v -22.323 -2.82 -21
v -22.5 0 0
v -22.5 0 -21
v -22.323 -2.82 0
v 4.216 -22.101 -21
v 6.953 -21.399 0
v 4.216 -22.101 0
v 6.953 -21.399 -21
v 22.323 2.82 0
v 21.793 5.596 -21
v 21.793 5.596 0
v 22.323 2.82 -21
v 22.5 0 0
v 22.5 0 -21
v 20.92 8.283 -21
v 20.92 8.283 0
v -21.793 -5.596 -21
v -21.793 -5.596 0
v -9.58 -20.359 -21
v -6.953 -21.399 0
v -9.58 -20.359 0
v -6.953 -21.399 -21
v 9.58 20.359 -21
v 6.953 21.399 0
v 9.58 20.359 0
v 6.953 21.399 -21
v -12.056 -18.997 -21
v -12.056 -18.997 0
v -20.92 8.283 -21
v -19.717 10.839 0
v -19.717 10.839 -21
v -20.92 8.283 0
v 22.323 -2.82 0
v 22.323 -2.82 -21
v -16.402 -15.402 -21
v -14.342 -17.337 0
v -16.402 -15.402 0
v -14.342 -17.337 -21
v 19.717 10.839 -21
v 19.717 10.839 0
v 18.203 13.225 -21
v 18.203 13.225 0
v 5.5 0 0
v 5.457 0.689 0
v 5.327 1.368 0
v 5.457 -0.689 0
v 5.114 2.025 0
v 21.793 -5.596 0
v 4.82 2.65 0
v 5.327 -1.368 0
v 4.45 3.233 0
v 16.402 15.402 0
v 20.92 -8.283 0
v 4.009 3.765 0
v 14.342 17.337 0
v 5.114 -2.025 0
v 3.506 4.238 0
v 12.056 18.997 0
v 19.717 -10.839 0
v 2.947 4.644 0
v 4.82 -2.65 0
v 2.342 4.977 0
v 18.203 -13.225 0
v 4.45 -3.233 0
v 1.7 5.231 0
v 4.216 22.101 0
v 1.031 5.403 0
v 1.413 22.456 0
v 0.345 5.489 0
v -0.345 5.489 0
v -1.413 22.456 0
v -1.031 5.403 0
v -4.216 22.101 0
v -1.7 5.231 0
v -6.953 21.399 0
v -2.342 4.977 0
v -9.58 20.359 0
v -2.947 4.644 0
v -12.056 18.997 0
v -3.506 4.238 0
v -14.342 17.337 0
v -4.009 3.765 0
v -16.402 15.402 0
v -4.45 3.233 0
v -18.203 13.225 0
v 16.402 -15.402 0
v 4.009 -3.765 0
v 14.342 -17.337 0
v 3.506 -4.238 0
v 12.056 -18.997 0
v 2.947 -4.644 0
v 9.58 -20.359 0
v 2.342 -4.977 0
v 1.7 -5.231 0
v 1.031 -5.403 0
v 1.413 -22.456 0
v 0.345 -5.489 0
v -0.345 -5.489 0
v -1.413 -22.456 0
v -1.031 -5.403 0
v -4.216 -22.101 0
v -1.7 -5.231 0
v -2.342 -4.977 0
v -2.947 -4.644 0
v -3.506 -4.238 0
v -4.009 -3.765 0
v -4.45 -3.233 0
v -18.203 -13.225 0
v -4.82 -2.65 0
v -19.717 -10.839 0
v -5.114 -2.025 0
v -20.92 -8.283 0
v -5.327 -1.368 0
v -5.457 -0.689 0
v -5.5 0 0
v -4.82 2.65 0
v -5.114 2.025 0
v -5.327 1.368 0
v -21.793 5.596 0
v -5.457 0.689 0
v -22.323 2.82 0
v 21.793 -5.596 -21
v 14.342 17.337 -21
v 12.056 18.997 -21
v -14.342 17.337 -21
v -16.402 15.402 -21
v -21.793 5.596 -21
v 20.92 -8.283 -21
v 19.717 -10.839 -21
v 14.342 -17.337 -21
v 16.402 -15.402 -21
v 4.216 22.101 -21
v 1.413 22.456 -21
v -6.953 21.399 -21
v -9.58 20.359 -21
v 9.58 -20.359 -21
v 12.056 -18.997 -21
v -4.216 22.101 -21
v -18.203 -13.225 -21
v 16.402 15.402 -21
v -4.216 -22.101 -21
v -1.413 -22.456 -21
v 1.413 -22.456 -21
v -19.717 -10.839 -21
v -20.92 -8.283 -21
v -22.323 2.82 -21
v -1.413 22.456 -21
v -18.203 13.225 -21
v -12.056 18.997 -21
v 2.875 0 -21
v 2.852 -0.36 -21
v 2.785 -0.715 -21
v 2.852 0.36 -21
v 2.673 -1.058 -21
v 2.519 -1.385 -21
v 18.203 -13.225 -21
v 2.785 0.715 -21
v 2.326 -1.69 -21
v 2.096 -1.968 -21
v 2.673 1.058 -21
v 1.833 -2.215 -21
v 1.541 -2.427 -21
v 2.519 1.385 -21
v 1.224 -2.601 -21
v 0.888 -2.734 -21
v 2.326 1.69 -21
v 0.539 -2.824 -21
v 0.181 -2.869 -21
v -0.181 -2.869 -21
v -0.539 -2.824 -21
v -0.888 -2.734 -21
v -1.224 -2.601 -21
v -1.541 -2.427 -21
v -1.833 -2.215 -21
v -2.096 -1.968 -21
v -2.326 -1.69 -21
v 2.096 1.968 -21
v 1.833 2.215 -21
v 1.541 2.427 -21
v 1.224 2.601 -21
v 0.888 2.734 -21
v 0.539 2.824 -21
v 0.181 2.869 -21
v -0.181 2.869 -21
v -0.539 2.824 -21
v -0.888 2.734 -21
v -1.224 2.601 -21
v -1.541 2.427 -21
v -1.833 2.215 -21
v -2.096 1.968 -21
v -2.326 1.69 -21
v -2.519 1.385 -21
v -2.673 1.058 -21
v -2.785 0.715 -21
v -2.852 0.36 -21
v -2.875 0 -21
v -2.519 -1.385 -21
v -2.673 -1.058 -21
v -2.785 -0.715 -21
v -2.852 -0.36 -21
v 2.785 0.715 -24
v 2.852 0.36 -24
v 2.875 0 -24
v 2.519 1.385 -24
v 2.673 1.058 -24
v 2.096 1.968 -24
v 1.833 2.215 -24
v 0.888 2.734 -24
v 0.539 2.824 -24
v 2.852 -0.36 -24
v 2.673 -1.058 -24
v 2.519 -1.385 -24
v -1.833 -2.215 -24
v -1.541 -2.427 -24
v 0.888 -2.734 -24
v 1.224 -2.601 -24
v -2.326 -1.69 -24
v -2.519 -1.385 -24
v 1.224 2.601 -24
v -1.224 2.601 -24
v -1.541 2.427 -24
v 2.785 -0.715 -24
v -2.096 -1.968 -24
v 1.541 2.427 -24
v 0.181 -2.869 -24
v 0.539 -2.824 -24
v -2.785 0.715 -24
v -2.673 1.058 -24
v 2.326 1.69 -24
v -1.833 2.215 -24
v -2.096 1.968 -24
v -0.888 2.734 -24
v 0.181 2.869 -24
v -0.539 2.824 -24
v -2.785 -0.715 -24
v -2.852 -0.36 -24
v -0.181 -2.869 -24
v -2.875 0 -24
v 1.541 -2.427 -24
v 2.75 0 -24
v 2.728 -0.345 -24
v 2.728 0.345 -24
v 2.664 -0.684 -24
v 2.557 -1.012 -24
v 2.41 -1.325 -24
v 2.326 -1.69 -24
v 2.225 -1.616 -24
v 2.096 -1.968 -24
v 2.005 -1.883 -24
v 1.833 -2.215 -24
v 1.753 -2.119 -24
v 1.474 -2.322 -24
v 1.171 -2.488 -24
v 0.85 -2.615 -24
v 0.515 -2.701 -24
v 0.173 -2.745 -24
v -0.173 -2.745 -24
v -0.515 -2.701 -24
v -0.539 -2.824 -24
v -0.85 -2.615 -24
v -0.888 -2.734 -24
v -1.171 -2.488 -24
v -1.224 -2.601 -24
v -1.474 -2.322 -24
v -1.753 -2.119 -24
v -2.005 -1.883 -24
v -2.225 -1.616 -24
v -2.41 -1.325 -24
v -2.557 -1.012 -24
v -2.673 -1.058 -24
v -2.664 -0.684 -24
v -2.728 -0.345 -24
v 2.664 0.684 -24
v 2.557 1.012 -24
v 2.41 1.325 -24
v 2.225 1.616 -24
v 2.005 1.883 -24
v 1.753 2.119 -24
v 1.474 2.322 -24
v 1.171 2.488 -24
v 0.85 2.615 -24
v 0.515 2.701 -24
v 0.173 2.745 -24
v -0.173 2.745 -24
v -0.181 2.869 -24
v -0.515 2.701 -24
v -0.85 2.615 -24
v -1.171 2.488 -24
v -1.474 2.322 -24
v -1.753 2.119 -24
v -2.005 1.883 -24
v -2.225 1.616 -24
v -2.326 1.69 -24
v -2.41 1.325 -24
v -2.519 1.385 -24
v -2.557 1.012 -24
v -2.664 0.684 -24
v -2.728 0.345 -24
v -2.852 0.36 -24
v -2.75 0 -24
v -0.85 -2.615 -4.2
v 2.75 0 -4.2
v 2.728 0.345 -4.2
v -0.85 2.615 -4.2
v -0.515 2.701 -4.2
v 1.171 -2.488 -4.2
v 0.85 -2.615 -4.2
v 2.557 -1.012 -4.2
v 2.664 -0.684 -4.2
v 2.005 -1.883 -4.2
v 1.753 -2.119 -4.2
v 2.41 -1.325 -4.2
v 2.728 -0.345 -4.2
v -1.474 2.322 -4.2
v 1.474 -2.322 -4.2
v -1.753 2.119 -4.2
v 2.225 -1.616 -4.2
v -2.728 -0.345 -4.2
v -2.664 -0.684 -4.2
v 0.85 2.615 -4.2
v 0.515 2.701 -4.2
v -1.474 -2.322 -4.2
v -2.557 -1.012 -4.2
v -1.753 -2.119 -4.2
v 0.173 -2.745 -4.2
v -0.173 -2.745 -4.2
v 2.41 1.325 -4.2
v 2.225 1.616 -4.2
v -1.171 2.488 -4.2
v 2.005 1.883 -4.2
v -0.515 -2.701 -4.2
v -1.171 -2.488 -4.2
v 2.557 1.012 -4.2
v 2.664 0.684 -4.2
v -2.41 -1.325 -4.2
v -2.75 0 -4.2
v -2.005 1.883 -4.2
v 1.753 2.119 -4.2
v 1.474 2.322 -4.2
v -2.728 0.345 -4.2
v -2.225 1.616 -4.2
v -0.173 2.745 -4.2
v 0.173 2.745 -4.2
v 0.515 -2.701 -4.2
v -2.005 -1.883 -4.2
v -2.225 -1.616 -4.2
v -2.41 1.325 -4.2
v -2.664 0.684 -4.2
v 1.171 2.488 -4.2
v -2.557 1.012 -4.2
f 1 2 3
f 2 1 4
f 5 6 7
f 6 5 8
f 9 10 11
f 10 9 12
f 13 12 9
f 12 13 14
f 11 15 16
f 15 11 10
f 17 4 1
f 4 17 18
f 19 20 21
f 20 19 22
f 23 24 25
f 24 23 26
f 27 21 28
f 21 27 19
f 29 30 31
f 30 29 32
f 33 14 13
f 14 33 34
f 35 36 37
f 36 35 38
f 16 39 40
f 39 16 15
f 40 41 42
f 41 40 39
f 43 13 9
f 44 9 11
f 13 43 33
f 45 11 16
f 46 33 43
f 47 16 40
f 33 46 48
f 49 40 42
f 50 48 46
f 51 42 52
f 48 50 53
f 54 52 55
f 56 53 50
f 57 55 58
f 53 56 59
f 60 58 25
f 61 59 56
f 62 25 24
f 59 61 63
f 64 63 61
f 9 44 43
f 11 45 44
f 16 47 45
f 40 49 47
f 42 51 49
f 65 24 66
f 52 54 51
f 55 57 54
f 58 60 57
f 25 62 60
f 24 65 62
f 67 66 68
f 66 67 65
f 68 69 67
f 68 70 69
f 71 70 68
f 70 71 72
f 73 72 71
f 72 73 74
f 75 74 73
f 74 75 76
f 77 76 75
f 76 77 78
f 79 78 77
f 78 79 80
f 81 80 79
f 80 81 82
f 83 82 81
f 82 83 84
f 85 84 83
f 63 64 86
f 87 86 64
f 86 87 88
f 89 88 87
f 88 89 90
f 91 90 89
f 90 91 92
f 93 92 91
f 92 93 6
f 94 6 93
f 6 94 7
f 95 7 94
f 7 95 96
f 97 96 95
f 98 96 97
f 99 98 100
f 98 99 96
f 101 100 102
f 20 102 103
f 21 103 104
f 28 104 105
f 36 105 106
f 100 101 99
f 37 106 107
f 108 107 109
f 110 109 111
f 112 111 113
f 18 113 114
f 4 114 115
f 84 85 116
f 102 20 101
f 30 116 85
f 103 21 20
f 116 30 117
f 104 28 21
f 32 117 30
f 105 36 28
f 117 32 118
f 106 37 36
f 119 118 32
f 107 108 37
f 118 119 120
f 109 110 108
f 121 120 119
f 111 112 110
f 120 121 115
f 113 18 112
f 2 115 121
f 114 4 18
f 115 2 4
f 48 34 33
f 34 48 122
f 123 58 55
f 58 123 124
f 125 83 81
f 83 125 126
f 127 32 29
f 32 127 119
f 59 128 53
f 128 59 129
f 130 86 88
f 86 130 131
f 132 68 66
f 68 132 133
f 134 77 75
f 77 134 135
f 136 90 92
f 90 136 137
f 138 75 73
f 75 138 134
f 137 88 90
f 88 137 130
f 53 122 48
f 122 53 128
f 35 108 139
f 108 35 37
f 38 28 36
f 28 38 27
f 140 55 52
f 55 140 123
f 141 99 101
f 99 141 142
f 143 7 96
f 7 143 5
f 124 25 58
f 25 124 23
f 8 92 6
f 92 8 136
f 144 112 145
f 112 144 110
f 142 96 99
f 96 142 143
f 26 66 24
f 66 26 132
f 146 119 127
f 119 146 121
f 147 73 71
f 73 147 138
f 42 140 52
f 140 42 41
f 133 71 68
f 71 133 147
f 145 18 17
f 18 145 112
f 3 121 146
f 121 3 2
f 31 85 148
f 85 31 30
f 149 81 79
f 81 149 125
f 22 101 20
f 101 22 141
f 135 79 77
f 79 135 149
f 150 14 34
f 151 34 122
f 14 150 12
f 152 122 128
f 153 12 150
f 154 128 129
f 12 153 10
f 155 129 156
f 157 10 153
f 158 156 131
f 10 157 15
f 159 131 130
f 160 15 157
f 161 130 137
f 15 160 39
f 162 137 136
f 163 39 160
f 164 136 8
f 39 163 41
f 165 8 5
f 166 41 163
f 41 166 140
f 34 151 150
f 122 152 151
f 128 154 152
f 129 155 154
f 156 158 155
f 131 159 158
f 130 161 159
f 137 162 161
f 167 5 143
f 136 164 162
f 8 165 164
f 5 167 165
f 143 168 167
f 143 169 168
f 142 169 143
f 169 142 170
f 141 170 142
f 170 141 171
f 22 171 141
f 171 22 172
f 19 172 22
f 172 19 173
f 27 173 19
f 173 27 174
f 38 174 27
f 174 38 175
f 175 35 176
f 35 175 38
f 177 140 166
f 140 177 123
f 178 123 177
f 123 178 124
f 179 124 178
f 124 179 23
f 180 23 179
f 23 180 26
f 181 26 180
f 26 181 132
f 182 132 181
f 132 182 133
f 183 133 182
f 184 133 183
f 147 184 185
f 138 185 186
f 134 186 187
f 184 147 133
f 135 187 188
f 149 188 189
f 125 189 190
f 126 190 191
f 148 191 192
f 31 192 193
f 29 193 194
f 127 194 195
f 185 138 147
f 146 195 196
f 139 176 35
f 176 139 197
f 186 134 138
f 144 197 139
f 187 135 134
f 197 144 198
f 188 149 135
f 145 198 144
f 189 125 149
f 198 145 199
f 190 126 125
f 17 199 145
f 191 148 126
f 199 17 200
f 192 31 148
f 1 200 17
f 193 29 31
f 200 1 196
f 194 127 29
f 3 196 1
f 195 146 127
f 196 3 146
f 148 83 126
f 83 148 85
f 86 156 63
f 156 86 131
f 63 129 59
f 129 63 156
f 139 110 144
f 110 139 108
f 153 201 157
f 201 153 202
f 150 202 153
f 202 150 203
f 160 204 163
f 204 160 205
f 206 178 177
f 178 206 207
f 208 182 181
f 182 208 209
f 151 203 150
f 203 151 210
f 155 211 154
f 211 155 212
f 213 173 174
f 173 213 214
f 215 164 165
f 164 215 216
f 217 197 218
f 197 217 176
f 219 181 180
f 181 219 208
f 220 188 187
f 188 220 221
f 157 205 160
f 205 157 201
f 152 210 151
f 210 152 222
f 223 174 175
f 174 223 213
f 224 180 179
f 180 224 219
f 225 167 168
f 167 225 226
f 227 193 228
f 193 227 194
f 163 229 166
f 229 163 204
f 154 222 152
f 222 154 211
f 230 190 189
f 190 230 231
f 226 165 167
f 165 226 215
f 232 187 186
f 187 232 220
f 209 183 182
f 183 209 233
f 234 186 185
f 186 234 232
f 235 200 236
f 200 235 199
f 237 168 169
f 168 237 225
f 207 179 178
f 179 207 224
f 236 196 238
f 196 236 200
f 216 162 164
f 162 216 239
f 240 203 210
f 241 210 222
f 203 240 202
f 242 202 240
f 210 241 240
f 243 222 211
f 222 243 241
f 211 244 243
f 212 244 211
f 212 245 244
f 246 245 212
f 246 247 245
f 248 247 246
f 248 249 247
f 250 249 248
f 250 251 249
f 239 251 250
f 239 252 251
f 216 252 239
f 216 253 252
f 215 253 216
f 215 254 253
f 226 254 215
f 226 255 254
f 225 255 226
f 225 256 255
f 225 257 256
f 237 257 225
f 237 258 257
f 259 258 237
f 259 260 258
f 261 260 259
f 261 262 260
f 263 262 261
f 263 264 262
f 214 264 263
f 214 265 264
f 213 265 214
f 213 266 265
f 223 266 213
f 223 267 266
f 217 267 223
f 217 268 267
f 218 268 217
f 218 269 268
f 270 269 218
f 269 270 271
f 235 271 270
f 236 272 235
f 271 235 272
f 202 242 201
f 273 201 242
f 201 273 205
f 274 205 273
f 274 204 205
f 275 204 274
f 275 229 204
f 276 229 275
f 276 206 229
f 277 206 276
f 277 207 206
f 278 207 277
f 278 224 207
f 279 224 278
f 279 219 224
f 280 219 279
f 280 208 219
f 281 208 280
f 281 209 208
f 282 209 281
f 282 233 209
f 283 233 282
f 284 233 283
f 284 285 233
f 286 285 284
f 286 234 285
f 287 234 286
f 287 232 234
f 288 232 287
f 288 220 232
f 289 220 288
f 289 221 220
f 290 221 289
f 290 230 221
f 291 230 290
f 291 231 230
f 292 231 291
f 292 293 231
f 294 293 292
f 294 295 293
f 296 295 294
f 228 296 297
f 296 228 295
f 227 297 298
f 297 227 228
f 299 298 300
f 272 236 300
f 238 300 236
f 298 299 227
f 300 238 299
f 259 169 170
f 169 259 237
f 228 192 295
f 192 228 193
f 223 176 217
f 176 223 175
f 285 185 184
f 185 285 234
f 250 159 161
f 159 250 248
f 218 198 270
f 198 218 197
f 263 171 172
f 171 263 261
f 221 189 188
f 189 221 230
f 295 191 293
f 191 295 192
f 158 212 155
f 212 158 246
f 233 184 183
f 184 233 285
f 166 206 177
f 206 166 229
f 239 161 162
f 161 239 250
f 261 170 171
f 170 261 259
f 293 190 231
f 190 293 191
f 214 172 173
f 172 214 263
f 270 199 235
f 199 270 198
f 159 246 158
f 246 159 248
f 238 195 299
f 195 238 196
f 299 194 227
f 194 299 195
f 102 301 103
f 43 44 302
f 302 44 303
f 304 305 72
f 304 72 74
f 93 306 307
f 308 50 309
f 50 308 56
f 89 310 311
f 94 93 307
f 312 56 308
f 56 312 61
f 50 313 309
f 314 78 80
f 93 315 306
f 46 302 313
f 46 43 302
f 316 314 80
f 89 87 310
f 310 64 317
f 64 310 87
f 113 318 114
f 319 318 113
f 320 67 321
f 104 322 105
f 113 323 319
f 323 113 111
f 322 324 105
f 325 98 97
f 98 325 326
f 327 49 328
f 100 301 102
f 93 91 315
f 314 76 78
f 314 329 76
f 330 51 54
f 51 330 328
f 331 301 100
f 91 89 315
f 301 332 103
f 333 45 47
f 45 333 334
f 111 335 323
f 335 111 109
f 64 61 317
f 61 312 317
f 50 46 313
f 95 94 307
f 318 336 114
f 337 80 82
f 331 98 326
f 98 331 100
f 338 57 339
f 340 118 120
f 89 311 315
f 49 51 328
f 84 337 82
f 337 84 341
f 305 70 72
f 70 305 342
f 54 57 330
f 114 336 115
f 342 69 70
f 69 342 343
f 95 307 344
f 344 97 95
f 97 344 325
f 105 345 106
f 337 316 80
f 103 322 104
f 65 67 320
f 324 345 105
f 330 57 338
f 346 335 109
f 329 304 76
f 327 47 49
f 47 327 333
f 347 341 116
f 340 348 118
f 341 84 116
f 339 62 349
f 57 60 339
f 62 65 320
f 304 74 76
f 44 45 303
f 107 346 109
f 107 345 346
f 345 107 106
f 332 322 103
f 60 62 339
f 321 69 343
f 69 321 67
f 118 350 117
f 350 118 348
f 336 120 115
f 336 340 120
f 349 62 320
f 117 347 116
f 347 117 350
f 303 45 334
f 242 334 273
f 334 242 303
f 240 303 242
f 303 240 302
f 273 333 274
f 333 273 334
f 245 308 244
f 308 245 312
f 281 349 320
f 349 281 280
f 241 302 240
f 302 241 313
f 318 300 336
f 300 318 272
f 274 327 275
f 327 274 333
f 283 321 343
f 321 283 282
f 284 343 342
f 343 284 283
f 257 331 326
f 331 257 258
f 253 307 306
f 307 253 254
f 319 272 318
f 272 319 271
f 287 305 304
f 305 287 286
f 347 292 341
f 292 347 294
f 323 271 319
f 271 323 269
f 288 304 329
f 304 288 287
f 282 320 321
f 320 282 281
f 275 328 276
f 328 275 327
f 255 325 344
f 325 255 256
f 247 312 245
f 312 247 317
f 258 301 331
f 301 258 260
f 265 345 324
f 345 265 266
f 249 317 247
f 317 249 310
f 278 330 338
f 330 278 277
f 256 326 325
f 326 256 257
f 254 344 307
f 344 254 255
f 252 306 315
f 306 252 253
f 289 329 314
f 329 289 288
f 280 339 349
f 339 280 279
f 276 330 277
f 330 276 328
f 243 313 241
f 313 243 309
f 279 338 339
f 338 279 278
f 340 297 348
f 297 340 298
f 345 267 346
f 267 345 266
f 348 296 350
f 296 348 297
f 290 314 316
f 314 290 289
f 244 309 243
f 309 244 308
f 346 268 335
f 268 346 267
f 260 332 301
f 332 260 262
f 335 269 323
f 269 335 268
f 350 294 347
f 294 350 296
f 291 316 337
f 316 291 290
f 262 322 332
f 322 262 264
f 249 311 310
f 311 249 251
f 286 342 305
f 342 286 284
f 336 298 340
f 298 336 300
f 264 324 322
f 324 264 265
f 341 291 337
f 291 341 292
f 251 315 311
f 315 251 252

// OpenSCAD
$fn = 50;

difference() {
	union() {
		translate(v = [0, 0, -21.0]) {
			cylinder(h = 21, r = 22.5);
		}
		#translate(v = [0, 0, -24.0]) {
			cylinder(h = 24, r = 2.875);
		}
	}
	union() {
		translate(v = [0, 0, 0]) {
			rotate(a = [0, 0, 0]) {
				difference() {
					union() {
						translate(v = [0, 0, -24.0]) {
							cylinder(h = 24, r = 2.25);
						}
						translate(v = [0, 0, -4.2]) {
							cylinder(h = 4.2, r1 = 2.75, r2 = 5.5);
						}
						translate(v = [0, 0, -24.0]) {
							cylinder(h = 24, r = 2.75);
						}
						translate(v = [0, 0, -24.0]) {
							cylinder(h = 24, r = 2.25);
						}
					}
					union();
				}
			}
		}
	}
}
